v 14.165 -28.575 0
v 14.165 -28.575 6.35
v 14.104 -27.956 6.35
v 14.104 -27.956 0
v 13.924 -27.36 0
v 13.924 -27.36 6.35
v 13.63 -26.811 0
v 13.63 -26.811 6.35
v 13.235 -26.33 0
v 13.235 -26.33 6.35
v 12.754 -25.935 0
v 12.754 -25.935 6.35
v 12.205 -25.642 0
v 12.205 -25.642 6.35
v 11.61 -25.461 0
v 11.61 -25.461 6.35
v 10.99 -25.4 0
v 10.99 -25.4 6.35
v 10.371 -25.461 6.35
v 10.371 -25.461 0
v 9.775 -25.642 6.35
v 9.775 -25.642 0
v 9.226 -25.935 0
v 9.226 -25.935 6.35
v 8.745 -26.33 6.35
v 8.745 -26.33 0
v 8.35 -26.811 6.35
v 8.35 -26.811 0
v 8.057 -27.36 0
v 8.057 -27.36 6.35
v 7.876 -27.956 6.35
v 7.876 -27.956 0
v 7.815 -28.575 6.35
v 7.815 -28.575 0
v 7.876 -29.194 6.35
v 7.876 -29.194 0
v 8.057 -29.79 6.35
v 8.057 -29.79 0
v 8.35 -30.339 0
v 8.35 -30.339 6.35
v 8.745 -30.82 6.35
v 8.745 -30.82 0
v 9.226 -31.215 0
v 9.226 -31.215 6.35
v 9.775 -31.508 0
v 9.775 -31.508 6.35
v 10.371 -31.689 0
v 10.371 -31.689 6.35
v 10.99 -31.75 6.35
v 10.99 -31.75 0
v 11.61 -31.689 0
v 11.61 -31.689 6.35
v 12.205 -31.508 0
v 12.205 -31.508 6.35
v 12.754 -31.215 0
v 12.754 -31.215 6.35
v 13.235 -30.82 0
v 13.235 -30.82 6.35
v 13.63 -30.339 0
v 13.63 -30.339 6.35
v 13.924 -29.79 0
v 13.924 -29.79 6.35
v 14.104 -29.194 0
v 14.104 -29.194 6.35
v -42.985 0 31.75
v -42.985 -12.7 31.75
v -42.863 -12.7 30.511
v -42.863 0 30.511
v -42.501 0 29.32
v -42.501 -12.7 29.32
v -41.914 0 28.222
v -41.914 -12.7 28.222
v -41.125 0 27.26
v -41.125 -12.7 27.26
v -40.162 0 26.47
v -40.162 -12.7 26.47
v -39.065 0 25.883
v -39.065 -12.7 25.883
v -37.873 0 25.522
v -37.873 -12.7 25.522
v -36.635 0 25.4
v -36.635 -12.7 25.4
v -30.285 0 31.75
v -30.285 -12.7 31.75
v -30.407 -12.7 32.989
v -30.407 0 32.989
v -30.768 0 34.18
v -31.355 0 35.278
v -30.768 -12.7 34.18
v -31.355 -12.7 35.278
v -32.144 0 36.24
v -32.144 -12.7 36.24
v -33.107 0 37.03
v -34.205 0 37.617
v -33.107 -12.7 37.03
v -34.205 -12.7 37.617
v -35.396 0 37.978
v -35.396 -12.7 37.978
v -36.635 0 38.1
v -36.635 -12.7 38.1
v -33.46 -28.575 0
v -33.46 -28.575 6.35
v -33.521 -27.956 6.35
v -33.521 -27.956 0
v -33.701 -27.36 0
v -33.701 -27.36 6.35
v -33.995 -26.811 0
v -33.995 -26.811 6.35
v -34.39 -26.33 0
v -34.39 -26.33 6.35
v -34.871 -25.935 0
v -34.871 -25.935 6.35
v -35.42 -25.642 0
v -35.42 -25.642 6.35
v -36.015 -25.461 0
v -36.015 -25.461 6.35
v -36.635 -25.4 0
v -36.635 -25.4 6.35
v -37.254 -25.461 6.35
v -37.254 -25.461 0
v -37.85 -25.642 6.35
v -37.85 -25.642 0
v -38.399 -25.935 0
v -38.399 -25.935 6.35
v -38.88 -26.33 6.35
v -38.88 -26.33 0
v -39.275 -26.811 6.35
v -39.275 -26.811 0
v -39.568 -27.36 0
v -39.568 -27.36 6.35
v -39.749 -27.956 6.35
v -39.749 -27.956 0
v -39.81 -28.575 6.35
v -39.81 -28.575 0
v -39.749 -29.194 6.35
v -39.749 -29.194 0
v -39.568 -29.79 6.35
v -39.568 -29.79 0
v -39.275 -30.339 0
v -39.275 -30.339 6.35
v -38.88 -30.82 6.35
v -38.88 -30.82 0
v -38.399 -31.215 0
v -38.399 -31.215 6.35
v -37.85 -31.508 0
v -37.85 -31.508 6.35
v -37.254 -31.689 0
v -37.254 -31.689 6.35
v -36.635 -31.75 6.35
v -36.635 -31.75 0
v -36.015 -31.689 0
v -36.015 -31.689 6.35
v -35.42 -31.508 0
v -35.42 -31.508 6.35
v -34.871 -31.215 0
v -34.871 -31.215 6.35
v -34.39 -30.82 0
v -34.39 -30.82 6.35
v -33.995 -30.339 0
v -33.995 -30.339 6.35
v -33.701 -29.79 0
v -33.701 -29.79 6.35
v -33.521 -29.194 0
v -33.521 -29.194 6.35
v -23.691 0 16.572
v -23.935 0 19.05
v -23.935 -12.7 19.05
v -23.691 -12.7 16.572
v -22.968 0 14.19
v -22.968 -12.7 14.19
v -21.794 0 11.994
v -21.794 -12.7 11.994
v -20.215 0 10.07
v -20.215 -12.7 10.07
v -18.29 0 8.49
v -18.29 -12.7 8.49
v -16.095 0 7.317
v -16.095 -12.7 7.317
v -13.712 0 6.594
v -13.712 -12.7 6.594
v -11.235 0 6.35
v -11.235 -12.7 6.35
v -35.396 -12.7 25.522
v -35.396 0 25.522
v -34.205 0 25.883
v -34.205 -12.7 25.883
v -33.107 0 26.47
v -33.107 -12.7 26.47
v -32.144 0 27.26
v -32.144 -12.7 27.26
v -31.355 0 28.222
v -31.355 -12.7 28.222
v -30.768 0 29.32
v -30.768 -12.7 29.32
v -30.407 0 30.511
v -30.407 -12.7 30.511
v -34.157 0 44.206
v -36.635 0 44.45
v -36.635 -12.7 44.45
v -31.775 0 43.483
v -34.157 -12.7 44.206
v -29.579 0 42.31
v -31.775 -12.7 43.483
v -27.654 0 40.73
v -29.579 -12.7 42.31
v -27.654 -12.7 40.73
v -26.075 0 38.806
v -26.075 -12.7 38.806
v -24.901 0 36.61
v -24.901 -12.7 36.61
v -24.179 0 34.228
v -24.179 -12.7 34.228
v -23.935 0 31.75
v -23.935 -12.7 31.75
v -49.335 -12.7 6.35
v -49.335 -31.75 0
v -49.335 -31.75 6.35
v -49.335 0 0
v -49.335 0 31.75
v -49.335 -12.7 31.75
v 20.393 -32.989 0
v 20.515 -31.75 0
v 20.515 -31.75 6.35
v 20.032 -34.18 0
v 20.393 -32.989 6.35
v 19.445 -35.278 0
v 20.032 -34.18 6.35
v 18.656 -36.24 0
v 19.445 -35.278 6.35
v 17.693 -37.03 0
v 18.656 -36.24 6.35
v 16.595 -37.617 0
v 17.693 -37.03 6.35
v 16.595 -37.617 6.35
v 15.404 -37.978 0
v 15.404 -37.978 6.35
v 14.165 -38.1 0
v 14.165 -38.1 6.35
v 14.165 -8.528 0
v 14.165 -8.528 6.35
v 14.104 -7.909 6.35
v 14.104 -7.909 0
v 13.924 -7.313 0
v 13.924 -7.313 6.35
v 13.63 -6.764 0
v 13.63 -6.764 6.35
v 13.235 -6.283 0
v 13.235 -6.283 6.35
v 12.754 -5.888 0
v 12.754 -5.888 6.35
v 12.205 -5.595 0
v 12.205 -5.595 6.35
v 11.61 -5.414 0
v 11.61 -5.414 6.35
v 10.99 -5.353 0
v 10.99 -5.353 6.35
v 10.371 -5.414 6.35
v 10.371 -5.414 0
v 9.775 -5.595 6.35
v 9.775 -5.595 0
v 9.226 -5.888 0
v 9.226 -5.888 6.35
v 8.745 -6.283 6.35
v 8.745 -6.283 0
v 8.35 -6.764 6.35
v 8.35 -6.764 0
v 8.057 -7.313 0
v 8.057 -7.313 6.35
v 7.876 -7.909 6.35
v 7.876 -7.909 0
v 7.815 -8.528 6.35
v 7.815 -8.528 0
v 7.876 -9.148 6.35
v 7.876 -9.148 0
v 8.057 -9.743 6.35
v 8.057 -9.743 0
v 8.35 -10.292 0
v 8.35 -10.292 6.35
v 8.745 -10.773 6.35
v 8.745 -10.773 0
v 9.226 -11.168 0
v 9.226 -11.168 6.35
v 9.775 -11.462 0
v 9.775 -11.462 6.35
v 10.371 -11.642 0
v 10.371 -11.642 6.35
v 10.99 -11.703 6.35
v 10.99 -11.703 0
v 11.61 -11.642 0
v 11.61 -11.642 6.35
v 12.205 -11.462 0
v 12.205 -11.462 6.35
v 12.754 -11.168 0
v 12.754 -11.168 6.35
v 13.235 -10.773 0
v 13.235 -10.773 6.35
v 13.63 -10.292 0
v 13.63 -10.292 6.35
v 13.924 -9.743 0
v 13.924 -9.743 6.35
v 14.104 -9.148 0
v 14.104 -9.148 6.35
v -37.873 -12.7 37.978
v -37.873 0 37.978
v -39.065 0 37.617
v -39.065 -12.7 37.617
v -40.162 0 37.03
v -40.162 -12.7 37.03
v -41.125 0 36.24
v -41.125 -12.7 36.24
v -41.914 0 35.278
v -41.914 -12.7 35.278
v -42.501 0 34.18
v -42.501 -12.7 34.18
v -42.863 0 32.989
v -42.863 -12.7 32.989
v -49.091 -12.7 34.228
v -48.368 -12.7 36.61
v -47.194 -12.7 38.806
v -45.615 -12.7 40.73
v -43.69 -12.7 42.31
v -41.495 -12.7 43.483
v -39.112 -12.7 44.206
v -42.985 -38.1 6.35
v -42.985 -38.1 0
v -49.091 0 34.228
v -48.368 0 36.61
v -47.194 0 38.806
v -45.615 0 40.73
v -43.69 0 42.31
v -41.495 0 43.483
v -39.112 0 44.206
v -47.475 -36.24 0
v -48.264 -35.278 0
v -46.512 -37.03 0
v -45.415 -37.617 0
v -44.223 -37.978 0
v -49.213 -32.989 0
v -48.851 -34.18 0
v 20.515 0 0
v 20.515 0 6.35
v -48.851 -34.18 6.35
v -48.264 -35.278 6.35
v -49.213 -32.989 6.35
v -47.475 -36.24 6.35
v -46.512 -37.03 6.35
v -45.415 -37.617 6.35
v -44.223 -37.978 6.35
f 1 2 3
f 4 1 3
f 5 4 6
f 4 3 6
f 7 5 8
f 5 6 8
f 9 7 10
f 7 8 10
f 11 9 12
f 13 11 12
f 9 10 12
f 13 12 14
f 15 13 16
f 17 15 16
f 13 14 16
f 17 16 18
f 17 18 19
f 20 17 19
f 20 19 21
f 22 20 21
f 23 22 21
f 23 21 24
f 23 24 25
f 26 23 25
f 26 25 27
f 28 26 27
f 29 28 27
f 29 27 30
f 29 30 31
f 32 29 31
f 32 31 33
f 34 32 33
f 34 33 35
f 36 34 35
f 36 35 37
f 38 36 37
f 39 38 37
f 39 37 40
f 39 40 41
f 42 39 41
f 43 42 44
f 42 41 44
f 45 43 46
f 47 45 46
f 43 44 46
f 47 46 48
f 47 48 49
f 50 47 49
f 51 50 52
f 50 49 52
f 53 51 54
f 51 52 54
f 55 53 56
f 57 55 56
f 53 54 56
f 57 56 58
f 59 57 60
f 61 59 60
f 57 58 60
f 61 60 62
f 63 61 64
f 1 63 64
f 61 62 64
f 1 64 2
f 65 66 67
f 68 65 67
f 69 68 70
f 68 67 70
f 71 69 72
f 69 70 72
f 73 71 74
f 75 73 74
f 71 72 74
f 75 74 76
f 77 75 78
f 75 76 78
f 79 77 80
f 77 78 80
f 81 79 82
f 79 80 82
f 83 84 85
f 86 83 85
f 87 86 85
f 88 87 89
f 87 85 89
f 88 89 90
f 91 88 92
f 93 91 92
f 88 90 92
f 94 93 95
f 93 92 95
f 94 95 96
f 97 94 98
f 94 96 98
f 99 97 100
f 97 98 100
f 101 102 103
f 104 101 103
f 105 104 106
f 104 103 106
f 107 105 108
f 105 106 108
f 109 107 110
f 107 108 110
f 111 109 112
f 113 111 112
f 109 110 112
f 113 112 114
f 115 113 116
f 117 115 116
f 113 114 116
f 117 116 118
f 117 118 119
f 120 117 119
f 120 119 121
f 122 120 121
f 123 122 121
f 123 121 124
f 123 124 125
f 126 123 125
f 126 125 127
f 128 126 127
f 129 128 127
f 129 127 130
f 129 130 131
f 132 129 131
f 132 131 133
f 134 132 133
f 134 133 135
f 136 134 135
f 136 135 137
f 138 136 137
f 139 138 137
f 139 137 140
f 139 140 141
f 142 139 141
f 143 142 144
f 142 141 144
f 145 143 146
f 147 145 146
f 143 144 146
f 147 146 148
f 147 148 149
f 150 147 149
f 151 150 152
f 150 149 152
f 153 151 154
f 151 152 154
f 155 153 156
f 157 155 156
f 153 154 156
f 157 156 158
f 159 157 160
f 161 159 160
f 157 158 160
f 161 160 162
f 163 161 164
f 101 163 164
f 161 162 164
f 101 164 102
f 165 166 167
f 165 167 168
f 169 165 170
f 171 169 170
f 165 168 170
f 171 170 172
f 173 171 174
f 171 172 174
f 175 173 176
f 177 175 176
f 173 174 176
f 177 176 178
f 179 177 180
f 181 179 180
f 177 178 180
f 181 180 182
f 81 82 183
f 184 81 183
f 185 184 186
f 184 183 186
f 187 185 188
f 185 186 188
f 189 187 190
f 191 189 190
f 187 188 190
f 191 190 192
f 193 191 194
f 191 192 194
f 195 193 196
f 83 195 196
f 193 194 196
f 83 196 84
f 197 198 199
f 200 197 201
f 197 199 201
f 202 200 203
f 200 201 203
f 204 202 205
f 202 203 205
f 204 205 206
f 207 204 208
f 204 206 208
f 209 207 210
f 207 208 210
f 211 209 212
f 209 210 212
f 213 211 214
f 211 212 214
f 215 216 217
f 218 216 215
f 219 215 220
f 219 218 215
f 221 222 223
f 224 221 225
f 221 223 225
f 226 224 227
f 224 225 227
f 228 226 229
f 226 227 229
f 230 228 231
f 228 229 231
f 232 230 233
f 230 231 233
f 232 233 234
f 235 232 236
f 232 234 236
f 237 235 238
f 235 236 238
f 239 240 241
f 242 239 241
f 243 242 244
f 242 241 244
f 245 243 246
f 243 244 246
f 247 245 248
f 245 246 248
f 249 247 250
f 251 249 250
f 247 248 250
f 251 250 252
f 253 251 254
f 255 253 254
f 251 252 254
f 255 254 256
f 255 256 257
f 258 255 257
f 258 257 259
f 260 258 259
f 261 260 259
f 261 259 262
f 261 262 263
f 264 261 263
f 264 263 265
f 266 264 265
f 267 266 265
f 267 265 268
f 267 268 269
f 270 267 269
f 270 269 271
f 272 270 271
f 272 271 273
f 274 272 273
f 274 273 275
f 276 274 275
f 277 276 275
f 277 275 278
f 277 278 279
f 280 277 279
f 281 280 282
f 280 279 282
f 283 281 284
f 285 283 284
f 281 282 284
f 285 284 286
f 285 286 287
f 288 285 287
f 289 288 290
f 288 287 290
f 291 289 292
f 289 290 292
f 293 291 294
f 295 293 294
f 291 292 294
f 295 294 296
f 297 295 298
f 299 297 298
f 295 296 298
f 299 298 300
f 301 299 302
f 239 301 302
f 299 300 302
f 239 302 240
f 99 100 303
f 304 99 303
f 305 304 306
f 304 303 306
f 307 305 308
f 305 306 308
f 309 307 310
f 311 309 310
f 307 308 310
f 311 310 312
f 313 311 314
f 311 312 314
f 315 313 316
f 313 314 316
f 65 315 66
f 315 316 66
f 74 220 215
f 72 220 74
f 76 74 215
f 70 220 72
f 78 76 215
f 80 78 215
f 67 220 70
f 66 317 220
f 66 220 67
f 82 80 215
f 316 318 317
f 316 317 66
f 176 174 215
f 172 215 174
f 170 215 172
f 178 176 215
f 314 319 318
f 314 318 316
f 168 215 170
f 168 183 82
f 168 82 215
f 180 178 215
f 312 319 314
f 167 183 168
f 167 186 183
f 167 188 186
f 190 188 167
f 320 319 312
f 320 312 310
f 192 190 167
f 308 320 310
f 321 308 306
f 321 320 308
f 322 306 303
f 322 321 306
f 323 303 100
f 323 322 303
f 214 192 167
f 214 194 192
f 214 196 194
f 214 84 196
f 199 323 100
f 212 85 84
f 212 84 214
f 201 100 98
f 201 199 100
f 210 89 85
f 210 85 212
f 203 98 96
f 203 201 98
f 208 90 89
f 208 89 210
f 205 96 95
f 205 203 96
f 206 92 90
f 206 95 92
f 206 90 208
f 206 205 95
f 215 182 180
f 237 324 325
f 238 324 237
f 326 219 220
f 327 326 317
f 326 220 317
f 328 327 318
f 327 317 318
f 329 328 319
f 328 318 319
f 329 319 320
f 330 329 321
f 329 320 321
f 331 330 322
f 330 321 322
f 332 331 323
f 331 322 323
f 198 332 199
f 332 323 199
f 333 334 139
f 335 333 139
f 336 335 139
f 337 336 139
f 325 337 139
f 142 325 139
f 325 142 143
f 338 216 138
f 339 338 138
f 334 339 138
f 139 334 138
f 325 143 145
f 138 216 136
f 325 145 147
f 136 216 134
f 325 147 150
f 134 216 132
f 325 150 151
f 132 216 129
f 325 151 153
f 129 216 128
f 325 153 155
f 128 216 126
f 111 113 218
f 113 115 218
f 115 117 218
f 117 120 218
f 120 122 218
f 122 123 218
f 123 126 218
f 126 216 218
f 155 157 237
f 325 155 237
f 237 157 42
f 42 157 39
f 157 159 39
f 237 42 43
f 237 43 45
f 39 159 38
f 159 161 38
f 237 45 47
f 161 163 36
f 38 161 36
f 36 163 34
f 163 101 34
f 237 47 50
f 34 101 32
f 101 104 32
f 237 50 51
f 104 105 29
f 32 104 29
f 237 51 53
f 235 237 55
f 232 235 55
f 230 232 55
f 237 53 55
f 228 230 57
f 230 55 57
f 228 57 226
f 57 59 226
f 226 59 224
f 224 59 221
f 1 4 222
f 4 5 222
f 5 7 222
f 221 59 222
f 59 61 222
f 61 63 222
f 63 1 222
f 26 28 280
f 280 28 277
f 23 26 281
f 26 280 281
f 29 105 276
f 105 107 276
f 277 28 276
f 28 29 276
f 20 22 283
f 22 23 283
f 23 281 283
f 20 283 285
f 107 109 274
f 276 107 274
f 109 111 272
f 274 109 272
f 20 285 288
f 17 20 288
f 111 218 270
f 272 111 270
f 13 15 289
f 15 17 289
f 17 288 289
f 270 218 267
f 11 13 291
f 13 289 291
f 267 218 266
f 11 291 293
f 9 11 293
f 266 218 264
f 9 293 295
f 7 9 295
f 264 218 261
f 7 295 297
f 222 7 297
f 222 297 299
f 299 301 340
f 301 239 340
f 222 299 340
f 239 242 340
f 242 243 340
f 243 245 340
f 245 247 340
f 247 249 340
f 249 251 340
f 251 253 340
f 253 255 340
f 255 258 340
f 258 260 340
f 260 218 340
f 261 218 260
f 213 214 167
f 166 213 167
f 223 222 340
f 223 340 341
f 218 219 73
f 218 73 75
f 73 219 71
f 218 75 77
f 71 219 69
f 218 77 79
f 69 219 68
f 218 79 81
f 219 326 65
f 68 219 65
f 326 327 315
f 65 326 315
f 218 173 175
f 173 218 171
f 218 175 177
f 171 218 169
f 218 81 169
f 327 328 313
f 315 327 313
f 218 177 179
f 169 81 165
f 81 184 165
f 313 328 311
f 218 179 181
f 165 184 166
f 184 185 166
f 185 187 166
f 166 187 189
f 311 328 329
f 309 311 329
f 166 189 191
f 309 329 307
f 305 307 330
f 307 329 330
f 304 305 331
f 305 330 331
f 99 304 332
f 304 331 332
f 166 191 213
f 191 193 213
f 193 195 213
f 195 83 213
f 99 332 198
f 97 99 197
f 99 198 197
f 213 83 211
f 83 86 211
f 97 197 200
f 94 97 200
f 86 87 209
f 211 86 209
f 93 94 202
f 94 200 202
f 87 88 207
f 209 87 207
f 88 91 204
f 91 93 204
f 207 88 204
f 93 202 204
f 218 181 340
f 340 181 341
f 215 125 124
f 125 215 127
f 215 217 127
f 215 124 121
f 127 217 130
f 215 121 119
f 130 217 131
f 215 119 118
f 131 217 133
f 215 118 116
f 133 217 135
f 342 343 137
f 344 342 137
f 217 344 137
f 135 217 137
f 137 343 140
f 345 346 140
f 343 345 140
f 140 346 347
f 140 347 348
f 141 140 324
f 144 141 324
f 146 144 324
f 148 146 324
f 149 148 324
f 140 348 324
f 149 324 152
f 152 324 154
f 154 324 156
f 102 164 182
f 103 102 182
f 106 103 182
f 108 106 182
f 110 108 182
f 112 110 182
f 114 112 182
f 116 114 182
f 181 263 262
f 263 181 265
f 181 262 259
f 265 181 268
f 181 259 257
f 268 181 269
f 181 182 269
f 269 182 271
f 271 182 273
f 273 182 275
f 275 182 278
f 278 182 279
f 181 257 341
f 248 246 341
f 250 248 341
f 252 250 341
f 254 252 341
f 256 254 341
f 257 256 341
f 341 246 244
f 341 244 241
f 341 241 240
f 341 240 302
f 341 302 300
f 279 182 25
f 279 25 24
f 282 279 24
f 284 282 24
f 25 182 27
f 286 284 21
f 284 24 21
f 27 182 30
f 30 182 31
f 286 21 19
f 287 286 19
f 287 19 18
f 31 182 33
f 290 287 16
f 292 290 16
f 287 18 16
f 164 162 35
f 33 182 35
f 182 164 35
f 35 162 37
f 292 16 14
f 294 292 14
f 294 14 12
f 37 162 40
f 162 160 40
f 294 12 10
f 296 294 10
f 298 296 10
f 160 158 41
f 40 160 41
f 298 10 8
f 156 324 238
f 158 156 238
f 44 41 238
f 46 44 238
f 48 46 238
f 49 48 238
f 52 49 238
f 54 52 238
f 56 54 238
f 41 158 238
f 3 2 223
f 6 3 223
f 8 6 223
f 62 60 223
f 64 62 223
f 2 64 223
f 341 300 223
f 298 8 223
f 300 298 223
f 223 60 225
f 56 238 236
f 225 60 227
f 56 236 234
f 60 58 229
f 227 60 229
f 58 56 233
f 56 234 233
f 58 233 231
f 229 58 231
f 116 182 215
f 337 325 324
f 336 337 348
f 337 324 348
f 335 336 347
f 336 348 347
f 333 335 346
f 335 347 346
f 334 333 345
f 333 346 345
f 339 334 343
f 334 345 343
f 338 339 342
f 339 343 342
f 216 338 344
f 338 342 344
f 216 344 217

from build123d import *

# Parameters (mm, degrees)
F0_W     = 69.85
F0_H     = 44.45
F1_DEPTH = 38.1
F3_DEPTH = 38.101
F4_DEPTH = 25.4
F5_R     = 3.175
F6_DEPTH = 6.351
F8_DEPTH = 12.701


with BuildPart() as f1:
    # F0 (on Front) → F1 (new body)
    with BuildSketch(Plane.XZ):
        with Locations((-14.4096150837, 22.225)):
            Rectangle(F0_W, F0_H)
    extrude(amount=F1_DEPTH)

    # F2 (on face) → F3 (cut, through all)
    with BuildSketch(Plane.XZ.offset(38.1)):
        with BuildLine():
            Line((-49.3346150837, 44.45), (-49.3346150837, 31.75))
            ThreePointArc((-49.3346150837, 31.75), (-45.6148712048, 40.7302561211), (-36.6346150837, 44.45))
            Line((-36.6346150837, 44.45), (-49.3346150837, 44.45))
        make_face()
        with BuildLine():
            Line((-23.9346150837, 31.75), (-23.9346150837, 19.05))
            Line((-23.9346150837, 19.05), (1.4653849163, 19.05))
            Line((1.4653849163, 19.05), (20.5153849163, 19.05))
            Line((20.5153849163, 19.05), (20.5153849163, 44.45))
            Line((20.5153849163, 44.45), (-36.6346150837, 44.45))
            ThreePointArc((-36.6346150837, 44.45), (-27.6543589626, 40.7302561211), (-23.9346150837, 31.75))
        make_face()
        with BuildLine():
            Line((1.4653849163, 19.05), (-23.9346150837, 19.05))
            ThreePointArc((-23.9346150837, 19.05), (-20.2148712048, 10.0697438789), (-11.2346150837, 6.35))
            ThreePointArc((-11.2346150837, 6.35), (-2.2543589626, 10.0697438789), (1.4653849163, 19.05))
        make_face()
        with BuildLine():
            Line((-11.2346150837, 6.35), (20.5153849163, 6.35))
            Line((20.5153849163, 6.35), (20.5153849163, 19.05))
            Line((20.5153849163, 19.05), (1.4653849163, 19.05))
            ThreePointArc((1.4653849163, 19.05), (-2.2543589626, 10.0697438789), (-11.2346150837, 6.35))
        make_face()
    extrude(amount=-F3_DEPTH, mode=Mode.SUBTRACT)

    # F2 (on face) → F4 (cut)
    with BuildSketch(Plane.XZ.offset(38.1)):
        Polygon((-49.3346150837, 31.75), (-49.3346150837, 6.35), (-23.9346150837, 6.35), (-23.9346150837, 19.05), (-23.9346150837, 31.75), align=None)
        with BuildLine():
            Line((-23.9346150837, 19.05), (-23.9346150837, 6.35))
            Line((-23.9346150837, 6.35), (-11.2346150837, 6.35))
            ThreePointArc((-11.2346150837, 6.35), (-20.2148712048, 10.0697438789), (-23.9346150837, 19.05))
        make_face()
        with BuildLine():
            ThreePointArc((-23.9346150837, 31.75), (-36.6346150837, 44.45), (-49.3346150837, 31.75))
            Line((-49.3346150837, 31.75), (-23.9346150837, 31.75))
        make_face()
        with BuildLine():
            Line((1.4653849163, 19.05), (-23.9346150837, 19.05))
            ThreePointArc((-23.9346150837, 19.05), (-20.2148712048, 10.0697438789), (-11.2346150837, 6.35))
            ThreePointArc((-11.2346150837, 6.35), (-2.2543589626, 10.0697438789), (1.4653849163, 19.05))
        make_face()
        with BuildLine():
            ThreePointArc((1.4653849163, 19.05), (-2.2543589626, 10.0697438789), (-11.2346150837, 6.35))
            Line((-11.2346150837, 6.35), (20.5153849163, 6.35))
            Line((20.5153849163, 6.35), (20.5153849163, 19.05))
            Line((20.5153849163, 19.05), (1.4653849163, 19.05))
        make_face()
    extrude(amount=-F4_DEPTH, mode=Mode.SUBTRACT)

    # F5 (on face) → F6 (cut, through all)
    with BuildSketch(Plane.XY.offset(6.35)):
        with Locations((10.9903849163, -8.5281981155)):
            Circle(F5_R)
        with Locations((10.9903849163, -28.575)):
            Circle(F5_R)
        with BuildLine():
            ThreePointArc((-42.9846150837, -38.1), (-47.4747431442, -36.2401280605), (-49.3346150837, -31.75))
            Line((-49.3346150837, -31.75), (-49.3346150837, -38.1))
            Line((-49.3346150837, -38.1), (-42.9846150837, -38.1))
        make_face()
        with BuildLine():
            ThreePointArc((20.5153849163, -31.75), (18.6555129768, -36.2401280605), (14.1653849163, -38.1))
            Line((14.1653849163, -38.1), (20.5153849163, -38.1))
            Line((20.5153849163, -38.1), (20.5153849163, -31.75))
        make_face()
        with Locations((-36.6346150837, -28.575)):
            Circle(F5_R)
    extrude(amount=-F6_DEPTH, mode=Mode.SUBTRACT)

    # F7 (on face) → F8 (cut, through all)
    with BuildSketch(Plane.XZ.offset(12.7)):
        with BuildLine():
            Line((-36.6346150837, 31.75), (-36.6346150837, 38.1))
            ThreePointArc((-36.6346150837, 38.1), (-41.1247431442, 36.2401280605), (-42.9846150837, 31.75))
            Line((-42.9846150837, 31.75), (-36.6346150837, 31.75))
        make_face()
        with BuildLine():
            ThreePointArc((-30.2846150837, 31.75), (-32.1444870232, 36.2401280605), (-36.6346150837, 38.1))
            Line((-36.6346150837, 38.1), (-36.6346150837, 31.75))
            Line((-36.6346150837, 31.75), (-30.2846150837, 31.75))
        make_face()
        with BuildLine():
            Line((-30.2846150837, 31.75), (-36.6346150837, 31.75))
            Line((-36.6346150837, 31.75), (-36.6346150837, 25.4))
            ThreePointArc((-36.6346150837, 25.4), (-32.1444870232, 27.2598719395), (-30.2846150837, 31.75))
        make_face()
        with BuildLine():
            Line((-36.6346150837, 25.4), (-36.6346150837, 31.75))
            Line((-36.6346150837, 31.75), (-42.9846150837, 31.75))
            ThreePointArc((-42.9846150837, 31.75), (-41.1247431442, 27.2598719395), (-36.6346150837, 25.4))
        make_face()
    extrude(amount=-F8_DEPTH, mode=Mode.SUBTRACT)


solid = f1.part
